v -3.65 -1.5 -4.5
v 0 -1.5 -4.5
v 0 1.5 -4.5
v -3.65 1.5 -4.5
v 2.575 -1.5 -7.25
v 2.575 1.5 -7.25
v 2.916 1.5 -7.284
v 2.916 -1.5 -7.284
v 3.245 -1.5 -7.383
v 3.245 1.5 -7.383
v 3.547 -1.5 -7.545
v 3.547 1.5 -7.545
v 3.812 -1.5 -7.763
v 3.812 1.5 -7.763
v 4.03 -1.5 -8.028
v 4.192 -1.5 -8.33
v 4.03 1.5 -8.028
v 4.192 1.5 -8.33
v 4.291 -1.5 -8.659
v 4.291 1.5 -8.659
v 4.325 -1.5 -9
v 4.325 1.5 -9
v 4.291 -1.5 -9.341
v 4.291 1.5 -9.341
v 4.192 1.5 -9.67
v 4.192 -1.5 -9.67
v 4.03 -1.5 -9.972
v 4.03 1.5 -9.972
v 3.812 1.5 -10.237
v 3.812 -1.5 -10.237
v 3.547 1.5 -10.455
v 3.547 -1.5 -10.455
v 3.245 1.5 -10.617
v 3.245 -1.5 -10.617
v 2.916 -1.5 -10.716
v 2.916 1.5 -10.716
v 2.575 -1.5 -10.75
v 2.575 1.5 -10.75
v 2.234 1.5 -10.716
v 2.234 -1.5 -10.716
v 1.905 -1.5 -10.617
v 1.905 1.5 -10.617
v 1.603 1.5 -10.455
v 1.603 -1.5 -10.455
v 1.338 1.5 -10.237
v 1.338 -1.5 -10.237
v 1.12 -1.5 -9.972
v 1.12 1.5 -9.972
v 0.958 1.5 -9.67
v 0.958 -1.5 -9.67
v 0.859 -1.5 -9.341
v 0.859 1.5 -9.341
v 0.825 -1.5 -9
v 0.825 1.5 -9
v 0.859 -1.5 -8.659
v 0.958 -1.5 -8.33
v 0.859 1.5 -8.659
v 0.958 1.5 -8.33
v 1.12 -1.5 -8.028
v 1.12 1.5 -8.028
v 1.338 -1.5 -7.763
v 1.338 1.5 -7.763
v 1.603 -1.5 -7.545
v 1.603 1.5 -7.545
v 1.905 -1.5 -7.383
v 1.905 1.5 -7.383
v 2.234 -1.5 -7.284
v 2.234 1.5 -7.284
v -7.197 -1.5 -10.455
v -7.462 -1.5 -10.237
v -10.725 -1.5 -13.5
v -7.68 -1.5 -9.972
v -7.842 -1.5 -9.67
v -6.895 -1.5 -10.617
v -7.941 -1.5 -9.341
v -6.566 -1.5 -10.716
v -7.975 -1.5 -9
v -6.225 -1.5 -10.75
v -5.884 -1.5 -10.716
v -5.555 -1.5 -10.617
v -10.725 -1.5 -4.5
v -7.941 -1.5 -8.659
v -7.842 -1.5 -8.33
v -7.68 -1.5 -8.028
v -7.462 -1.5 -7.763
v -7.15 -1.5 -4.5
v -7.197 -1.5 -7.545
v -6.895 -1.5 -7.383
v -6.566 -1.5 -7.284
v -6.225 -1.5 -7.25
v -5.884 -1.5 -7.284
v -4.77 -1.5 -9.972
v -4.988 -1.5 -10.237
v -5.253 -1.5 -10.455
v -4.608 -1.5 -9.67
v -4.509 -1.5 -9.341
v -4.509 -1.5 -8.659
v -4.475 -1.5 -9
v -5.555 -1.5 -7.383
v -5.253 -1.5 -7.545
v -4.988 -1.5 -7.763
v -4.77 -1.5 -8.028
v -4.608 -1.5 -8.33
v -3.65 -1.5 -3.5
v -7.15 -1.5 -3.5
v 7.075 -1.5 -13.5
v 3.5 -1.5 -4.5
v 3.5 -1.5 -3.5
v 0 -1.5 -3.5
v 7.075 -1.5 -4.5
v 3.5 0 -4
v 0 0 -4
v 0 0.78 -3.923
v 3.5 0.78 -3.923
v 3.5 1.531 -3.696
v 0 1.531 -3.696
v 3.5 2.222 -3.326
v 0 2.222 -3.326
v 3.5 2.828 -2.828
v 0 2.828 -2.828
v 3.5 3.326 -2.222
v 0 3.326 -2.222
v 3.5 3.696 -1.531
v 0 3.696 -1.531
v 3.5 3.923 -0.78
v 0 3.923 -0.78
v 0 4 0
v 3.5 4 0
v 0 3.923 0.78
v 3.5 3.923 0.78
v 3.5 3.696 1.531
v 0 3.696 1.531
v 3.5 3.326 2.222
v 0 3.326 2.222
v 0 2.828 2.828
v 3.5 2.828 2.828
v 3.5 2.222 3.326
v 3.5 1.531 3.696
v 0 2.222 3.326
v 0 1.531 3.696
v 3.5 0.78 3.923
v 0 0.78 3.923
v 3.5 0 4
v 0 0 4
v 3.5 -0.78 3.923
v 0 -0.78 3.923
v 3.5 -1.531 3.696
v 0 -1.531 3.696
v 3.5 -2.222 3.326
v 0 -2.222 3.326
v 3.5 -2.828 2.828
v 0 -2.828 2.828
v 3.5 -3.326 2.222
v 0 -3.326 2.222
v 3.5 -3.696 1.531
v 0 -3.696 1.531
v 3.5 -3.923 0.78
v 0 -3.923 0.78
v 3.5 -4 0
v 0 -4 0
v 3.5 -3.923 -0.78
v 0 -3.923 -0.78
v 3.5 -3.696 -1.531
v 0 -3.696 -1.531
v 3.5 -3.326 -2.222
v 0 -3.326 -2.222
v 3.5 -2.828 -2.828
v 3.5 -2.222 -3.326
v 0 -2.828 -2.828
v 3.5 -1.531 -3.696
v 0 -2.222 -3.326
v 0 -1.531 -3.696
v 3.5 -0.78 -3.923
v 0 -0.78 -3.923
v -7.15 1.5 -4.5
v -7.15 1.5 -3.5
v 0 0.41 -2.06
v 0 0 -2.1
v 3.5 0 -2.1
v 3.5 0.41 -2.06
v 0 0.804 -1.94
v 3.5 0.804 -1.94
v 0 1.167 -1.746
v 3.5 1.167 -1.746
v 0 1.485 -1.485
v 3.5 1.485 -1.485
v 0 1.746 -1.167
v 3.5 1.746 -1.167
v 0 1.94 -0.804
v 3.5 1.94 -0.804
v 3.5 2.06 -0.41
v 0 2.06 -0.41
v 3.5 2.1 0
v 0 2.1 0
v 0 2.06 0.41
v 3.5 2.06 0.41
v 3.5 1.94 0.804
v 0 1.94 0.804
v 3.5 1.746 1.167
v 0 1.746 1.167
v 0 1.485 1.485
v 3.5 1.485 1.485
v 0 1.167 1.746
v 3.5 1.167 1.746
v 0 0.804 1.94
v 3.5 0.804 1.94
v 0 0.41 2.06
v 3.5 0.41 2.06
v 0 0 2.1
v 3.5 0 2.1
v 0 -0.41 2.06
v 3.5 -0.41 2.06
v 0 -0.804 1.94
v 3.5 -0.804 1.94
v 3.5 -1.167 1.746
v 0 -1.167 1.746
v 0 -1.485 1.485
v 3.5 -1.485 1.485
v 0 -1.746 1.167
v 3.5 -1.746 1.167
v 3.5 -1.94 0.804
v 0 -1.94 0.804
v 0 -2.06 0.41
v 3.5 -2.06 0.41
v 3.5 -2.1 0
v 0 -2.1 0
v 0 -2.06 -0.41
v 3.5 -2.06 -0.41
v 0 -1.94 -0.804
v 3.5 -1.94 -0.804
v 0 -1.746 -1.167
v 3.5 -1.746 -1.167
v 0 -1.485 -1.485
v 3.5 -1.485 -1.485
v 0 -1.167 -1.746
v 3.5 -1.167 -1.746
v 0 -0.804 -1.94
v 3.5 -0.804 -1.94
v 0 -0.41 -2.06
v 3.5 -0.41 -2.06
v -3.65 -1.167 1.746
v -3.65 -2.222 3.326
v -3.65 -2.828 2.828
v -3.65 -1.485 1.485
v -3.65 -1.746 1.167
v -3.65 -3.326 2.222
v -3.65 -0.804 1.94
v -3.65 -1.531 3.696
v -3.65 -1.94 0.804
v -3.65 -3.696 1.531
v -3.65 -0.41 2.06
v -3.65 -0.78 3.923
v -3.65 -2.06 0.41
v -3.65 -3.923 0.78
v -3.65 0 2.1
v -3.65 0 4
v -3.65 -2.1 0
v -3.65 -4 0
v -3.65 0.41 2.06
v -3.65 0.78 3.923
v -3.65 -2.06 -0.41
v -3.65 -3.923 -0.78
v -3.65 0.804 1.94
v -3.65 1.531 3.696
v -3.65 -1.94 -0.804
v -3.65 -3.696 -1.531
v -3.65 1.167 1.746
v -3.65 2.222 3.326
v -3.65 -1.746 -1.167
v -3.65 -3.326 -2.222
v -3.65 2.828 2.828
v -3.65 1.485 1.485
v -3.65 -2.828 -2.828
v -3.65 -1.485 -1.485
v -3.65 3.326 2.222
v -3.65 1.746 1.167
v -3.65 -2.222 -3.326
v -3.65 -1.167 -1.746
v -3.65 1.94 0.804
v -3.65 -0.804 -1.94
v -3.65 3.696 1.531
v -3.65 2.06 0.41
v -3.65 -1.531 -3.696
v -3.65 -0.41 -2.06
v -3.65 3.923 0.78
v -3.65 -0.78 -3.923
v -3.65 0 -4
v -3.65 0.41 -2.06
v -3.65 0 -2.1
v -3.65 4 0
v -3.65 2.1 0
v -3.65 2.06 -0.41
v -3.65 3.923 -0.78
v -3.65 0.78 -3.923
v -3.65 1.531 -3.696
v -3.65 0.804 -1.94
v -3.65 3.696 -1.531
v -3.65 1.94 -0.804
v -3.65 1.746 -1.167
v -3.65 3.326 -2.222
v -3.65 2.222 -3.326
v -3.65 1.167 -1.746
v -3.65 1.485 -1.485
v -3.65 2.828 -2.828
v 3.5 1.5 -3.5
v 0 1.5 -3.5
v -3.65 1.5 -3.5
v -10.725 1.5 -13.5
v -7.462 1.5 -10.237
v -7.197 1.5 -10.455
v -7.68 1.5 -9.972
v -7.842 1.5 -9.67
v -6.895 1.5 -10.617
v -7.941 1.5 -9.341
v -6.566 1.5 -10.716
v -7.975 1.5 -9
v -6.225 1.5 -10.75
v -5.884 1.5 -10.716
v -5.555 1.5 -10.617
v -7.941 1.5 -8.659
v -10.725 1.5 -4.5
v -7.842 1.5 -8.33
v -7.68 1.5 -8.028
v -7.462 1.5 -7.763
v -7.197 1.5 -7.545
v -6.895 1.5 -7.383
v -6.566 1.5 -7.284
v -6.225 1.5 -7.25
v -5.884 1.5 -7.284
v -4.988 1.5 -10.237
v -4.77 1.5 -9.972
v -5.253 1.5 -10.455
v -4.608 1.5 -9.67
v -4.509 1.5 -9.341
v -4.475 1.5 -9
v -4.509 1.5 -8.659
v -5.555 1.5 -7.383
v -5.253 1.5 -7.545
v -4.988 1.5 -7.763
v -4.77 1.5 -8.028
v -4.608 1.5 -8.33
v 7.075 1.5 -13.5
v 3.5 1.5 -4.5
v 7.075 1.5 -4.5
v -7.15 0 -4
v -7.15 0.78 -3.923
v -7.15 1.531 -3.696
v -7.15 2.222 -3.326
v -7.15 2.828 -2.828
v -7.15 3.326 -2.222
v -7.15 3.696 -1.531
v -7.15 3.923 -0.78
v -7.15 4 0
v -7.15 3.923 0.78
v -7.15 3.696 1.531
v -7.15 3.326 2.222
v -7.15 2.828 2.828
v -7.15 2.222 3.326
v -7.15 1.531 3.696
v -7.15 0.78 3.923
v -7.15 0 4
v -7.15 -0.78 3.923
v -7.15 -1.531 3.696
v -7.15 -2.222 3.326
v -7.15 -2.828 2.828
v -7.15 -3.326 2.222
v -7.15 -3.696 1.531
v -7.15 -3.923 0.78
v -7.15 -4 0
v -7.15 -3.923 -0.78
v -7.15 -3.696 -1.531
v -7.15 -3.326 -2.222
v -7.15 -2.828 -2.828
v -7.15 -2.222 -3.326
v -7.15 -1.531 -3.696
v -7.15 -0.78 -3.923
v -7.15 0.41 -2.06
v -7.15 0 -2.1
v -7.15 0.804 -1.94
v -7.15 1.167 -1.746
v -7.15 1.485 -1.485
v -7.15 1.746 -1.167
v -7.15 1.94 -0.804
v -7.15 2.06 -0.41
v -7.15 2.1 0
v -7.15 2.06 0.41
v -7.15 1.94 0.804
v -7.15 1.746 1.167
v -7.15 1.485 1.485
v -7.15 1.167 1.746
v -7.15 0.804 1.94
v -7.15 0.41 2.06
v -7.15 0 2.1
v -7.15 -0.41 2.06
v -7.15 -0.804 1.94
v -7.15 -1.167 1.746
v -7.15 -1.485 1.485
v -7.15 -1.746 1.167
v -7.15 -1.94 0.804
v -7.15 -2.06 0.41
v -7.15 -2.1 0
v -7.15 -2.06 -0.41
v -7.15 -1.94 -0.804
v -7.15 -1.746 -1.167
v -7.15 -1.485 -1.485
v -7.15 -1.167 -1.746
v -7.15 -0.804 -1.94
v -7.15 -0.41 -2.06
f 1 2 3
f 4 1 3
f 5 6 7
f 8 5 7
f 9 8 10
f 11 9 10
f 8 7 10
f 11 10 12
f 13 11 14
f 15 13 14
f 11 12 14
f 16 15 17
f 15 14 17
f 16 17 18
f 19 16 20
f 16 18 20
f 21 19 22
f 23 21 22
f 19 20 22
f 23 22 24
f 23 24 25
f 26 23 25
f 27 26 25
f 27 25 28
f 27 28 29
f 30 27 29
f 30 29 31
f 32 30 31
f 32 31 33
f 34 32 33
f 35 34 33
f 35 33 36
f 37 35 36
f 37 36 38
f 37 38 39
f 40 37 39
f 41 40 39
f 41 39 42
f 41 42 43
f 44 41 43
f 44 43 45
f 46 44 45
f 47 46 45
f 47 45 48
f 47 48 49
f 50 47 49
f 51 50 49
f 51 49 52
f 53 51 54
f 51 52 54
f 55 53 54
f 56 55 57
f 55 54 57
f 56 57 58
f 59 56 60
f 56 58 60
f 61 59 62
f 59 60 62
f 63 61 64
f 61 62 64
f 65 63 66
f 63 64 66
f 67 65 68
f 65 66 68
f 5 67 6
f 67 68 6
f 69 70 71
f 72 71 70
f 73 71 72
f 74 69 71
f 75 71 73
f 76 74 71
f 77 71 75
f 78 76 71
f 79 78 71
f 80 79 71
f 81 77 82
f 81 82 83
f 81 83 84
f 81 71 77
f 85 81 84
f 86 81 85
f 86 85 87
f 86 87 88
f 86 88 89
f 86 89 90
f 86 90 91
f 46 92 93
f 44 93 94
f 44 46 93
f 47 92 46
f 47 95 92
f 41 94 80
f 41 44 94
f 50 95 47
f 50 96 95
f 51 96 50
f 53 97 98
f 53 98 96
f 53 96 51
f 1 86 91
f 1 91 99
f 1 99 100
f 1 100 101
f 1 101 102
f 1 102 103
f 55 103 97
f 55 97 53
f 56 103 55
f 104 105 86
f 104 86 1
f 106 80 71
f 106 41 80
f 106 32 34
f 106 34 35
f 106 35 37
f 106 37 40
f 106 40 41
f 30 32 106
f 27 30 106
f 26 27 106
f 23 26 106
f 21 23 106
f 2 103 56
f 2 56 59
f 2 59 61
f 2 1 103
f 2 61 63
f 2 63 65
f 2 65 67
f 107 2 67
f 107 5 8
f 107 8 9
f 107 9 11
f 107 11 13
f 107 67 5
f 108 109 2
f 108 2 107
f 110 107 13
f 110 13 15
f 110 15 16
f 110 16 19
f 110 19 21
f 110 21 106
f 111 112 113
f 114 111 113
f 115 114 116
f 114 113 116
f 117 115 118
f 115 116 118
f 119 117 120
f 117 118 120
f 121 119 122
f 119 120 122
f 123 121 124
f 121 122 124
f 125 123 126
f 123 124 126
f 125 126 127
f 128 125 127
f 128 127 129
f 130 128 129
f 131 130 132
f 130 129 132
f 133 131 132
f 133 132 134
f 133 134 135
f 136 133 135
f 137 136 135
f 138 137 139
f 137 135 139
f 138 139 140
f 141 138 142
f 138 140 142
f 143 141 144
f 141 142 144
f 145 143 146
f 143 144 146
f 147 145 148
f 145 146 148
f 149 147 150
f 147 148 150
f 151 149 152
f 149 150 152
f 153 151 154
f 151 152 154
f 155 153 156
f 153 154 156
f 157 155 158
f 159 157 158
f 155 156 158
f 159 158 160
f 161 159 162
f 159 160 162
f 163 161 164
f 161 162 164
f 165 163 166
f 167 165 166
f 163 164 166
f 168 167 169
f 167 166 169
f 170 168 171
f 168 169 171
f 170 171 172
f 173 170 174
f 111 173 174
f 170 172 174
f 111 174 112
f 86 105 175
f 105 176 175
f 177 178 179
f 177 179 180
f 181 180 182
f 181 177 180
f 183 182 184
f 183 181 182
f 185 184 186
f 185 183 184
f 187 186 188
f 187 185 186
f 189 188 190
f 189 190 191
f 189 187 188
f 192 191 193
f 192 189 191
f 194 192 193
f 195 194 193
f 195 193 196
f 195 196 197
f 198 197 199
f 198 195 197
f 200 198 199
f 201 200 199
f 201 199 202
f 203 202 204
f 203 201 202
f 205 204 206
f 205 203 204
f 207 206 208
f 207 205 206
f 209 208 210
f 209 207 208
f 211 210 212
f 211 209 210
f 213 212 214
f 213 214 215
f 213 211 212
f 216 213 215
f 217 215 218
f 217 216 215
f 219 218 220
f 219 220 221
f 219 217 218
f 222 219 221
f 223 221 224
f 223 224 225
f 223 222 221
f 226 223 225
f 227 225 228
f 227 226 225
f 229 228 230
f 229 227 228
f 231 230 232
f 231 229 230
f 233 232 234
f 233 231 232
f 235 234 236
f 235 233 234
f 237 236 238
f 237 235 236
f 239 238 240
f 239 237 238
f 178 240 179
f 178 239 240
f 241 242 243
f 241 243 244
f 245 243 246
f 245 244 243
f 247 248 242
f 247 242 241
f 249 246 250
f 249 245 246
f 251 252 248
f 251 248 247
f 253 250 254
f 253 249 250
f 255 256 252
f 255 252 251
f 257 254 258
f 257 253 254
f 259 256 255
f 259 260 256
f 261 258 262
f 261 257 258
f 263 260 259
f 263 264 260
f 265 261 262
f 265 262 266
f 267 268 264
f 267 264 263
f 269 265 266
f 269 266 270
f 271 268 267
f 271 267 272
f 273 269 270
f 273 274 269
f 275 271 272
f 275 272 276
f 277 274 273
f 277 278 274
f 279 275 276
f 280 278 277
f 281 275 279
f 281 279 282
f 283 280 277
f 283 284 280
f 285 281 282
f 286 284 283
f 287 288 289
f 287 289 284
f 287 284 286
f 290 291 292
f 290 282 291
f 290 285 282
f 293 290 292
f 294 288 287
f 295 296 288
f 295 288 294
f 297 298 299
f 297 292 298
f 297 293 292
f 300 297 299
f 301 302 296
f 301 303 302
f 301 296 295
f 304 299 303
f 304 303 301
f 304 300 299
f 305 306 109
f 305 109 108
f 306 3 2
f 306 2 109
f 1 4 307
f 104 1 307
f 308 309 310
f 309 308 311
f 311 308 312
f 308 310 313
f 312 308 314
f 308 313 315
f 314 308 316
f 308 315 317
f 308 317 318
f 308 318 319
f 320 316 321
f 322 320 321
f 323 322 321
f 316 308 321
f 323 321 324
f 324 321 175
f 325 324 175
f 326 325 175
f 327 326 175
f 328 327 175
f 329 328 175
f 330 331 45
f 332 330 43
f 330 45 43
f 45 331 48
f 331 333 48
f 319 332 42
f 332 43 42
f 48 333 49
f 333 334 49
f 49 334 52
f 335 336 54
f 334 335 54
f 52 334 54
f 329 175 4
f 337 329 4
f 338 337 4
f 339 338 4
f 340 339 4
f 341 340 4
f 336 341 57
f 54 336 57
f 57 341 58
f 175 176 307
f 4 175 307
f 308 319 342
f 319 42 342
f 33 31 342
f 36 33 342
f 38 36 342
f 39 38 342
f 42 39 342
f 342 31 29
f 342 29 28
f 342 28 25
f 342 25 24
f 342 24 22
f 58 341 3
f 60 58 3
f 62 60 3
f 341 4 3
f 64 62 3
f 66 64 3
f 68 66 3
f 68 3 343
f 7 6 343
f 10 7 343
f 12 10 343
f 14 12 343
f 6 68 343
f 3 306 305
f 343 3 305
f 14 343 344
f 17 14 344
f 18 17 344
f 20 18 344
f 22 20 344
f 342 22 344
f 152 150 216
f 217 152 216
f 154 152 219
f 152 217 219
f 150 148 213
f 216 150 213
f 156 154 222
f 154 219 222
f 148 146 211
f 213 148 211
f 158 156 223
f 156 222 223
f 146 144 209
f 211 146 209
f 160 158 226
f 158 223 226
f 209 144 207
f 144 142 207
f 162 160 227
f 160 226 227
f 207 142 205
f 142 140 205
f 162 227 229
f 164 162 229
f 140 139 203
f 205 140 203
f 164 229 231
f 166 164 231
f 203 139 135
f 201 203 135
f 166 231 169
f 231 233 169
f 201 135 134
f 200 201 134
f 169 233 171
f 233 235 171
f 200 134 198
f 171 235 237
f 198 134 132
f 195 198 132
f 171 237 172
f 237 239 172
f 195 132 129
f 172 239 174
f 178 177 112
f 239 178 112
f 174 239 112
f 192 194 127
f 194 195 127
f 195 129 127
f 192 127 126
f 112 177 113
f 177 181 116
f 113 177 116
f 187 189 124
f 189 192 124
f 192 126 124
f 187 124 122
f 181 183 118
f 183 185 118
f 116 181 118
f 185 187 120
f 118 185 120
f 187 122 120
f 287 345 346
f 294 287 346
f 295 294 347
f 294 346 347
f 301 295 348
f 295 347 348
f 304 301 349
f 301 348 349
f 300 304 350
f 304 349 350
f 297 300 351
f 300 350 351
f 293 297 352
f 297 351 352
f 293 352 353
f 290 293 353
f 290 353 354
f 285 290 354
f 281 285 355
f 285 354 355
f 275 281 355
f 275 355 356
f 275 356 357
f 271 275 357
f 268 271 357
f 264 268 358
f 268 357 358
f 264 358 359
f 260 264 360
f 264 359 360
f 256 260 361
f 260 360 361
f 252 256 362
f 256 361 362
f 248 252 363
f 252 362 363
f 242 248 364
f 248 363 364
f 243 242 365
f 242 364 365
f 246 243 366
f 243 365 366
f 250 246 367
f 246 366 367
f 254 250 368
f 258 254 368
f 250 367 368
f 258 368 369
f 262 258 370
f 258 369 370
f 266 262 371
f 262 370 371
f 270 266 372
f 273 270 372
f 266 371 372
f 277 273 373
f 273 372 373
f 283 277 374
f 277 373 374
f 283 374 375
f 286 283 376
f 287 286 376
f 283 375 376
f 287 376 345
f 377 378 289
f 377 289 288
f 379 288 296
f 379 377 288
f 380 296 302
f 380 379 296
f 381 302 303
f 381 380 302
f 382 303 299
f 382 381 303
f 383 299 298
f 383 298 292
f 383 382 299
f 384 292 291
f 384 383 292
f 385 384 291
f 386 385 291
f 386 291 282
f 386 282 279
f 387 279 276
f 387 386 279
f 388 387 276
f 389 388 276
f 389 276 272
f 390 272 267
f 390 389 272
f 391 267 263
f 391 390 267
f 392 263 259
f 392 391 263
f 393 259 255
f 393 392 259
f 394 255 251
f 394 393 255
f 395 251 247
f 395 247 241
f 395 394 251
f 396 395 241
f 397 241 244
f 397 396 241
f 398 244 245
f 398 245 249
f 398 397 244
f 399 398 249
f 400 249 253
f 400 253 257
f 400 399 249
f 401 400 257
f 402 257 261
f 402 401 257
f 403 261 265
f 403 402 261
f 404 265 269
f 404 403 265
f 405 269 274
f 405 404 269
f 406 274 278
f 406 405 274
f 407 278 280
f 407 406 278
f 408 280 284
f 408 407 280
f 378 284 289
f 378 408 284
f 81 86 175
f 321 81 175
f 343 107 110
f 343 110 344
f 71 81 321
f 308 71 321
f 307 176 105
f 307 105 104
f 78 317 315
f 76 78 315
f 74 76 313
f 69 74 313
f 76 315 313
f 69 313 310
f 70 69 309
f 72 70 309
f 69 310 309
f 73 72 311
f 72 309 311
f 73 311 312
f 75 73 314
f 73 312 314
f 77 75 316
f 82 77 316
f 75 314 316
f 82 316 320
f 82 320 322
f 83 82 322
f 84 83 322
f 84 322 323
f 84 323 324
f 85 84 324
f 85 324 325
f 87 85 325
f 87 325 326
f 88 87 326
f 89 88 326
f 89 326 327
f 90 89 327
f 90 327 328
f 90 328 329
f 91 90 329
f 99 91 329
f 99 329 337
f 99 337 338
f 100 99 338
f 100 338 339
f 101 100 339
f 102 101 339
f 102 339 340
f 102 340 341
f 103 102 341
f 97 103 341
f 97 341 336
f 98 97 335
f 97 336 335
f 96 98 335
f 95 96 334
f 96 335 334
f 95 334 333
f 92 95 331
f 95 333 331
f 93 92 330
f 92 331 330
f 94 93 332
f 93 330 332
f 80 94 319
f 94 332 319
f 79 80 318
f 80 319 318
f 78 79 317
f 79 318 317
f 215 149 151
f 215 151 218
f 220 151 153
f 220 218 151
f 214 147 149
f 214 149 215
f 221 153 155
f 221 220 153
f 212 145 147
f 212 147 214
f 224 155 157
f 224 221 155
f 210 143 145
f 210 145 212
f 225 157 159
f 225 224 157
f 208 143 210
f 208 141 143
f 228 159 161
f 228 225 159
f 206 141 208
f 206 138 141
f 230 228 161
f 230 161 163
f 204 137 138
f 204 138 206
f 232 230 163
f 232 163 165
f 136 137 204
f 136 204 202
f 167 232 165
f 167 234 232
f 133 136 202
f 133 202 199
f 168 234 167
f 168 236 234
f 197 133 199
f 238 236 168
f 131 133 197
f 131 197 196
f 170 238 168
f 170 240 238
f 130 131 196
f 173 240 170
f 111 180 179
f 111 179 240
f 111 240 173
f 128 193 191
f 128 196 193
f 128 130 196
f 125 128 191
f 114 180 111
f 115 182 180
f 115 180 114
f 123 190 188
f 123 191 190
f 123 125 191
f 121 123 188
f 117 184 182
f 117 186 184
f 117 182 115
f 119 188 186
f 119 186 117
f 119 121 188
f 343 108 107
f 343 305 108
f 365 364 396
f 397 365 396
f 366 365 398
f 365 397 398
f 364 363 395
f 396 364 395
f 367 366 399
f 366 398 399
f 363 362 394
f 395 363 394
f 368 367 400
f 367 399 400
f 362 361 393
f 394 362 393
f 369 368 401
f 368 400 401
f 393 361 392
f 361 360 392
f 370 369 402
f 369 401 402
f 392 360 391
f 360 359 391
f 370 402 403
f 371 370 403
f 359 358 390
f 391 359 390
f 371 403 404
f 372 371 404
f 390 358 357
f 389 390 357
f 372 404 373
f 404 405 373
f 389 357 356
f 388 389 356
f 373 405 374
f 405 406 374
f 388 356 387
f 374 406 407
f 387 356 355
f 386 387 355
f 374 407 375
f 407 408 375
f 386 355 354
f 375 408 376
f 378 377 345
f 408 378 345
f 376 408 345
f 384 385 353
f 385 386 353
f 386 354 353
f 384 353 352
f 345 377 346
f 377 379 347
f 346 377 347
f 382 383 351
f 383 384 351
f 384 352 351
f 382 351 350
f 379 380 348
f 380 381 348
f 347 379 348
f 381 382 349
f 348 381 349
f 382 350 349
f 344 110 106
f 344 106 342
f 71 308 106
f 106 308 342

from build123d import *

# Parameters (mm, degrees)
CROQUIS1_R              = 4
CROQUIS1_R_2            = 2.1
SALIENTE_EXTRUIR1_DEPTH = 3.5
MATRIZL3_COUNT          = 2
MATRIZL3_PITCH          = 7.15
CROQUIS4_W              = 17.8
CROQUIS4_H              = 3
SALIENTE_EXTRUIR2_DEPTH = 10
CROQUIS5_R              = 1.75
CORTAR_EXTRUIR1_DEPTH   = 19.097669049
CROQUIS6_W              = 8.996759429
CROQUIS6_H              = 9.40282288
CORTAR_EXTRUIR2_DEPTH   = 21.015009993
CROQUIS7_W              = 9.055283223
CROQUIS7_H              = 9.327912758
CORTAR_EXTRUIR3_DEPTH   = 3.65


with BuildPart() as part:
    # Croquis1 → Saliente-Extruir1 (new body)
    with BuildSketch(Plane(origin=(0, 0, 0), x_dir=(0, -1, 0), z_dir=(1, 0, 0))):
        with Locations(Location((0, 0, 0), (0, 0, 90))):
            Circle(CROQUIS1_R)
        with Locations(Location((0, 0, 0), (0, 0, 90))):
            Circle(CROQUIS1_R_2, mode=Mode.SUBTRACT)
    extrude(amount=SALIENTE_EXTRUIR1_DEPTH)


with BuildPart() as matrizl3_1:
    # MatrizL3: pattern copy
    add(part.part.moved(Location(Vector(-1, 0, 0) * (1 * MATRIZL3_PITCH))))


with BuildPart() as body_3:
    # Croquis4 → Saliente-Extruir2 (new body)
    with BuildSketch(Plane.XY.offset(-3.5)):
        with Locations((-1.825, 0)):
            Rectangle(CROQUIS4_W, CROQUIS4_H)
    extrude(amount=-SALIENTE_EXTRUIR2_DEPTH)

    # Croquis5 → Cortar-Extruir1 (cut, through all)
    with BuildSketch(Plane(origin=(0, 1.5, 0), x_dir=(1, 0, 0), z_dir=(0, 1, 0))):
        with Locations(Location((2.575, 9, 0), (0, 0, 270))):
            Circle(CROQUIS5_R)
        with Locations(Location((-6.225, 9, 0), (0, 0, 90))):
            Circle(CROQUIS5_R)
    extrude(amount=-CORTAR_EXTRUIR1_DEPTH, mode=Mode.SUBTRACT)

    # Croquis6 → Cortar-Extruir2 (cut, through all)
    with BuildSketch(Plane(origin=(3.5, 0, 0), x_dir=(0, 0, -1), z_dir=(1, 0, 0))):
        with Locations((0.001620286, 0)):
            Rectangle(CROQUIS6_W, CROQUIS6_H)
    cortar_extruir2 = extrude(amount=CORTAR_EXTRUIR2_DEPTH, mode=Mode.SUBTRACT)

    # Croquis7 → Cortar-Extruir3 (cut)
    with BuildSketch(Plane.ZY):
        with Locations((0.027641611, 0)):
            Rectangle(CROQUIS7_W, CROQUIS7_H)
    extrude(amount=CORTAR_EXTRUIR3_DEPTH, mode=Mode.SUBTRACT)

    # Simetría1: Cortar-Extruir2 across plane
    add(cortar_extruir2.mirror(Plane(origin=(-1.825, 0, 0), x_dir=(0, 0, 1), z_dir=(1, 0, 0))), mode=Mode.SUBTRACT)


solid = Compound([part.part, matrizl3_1.part, body_3.part])
